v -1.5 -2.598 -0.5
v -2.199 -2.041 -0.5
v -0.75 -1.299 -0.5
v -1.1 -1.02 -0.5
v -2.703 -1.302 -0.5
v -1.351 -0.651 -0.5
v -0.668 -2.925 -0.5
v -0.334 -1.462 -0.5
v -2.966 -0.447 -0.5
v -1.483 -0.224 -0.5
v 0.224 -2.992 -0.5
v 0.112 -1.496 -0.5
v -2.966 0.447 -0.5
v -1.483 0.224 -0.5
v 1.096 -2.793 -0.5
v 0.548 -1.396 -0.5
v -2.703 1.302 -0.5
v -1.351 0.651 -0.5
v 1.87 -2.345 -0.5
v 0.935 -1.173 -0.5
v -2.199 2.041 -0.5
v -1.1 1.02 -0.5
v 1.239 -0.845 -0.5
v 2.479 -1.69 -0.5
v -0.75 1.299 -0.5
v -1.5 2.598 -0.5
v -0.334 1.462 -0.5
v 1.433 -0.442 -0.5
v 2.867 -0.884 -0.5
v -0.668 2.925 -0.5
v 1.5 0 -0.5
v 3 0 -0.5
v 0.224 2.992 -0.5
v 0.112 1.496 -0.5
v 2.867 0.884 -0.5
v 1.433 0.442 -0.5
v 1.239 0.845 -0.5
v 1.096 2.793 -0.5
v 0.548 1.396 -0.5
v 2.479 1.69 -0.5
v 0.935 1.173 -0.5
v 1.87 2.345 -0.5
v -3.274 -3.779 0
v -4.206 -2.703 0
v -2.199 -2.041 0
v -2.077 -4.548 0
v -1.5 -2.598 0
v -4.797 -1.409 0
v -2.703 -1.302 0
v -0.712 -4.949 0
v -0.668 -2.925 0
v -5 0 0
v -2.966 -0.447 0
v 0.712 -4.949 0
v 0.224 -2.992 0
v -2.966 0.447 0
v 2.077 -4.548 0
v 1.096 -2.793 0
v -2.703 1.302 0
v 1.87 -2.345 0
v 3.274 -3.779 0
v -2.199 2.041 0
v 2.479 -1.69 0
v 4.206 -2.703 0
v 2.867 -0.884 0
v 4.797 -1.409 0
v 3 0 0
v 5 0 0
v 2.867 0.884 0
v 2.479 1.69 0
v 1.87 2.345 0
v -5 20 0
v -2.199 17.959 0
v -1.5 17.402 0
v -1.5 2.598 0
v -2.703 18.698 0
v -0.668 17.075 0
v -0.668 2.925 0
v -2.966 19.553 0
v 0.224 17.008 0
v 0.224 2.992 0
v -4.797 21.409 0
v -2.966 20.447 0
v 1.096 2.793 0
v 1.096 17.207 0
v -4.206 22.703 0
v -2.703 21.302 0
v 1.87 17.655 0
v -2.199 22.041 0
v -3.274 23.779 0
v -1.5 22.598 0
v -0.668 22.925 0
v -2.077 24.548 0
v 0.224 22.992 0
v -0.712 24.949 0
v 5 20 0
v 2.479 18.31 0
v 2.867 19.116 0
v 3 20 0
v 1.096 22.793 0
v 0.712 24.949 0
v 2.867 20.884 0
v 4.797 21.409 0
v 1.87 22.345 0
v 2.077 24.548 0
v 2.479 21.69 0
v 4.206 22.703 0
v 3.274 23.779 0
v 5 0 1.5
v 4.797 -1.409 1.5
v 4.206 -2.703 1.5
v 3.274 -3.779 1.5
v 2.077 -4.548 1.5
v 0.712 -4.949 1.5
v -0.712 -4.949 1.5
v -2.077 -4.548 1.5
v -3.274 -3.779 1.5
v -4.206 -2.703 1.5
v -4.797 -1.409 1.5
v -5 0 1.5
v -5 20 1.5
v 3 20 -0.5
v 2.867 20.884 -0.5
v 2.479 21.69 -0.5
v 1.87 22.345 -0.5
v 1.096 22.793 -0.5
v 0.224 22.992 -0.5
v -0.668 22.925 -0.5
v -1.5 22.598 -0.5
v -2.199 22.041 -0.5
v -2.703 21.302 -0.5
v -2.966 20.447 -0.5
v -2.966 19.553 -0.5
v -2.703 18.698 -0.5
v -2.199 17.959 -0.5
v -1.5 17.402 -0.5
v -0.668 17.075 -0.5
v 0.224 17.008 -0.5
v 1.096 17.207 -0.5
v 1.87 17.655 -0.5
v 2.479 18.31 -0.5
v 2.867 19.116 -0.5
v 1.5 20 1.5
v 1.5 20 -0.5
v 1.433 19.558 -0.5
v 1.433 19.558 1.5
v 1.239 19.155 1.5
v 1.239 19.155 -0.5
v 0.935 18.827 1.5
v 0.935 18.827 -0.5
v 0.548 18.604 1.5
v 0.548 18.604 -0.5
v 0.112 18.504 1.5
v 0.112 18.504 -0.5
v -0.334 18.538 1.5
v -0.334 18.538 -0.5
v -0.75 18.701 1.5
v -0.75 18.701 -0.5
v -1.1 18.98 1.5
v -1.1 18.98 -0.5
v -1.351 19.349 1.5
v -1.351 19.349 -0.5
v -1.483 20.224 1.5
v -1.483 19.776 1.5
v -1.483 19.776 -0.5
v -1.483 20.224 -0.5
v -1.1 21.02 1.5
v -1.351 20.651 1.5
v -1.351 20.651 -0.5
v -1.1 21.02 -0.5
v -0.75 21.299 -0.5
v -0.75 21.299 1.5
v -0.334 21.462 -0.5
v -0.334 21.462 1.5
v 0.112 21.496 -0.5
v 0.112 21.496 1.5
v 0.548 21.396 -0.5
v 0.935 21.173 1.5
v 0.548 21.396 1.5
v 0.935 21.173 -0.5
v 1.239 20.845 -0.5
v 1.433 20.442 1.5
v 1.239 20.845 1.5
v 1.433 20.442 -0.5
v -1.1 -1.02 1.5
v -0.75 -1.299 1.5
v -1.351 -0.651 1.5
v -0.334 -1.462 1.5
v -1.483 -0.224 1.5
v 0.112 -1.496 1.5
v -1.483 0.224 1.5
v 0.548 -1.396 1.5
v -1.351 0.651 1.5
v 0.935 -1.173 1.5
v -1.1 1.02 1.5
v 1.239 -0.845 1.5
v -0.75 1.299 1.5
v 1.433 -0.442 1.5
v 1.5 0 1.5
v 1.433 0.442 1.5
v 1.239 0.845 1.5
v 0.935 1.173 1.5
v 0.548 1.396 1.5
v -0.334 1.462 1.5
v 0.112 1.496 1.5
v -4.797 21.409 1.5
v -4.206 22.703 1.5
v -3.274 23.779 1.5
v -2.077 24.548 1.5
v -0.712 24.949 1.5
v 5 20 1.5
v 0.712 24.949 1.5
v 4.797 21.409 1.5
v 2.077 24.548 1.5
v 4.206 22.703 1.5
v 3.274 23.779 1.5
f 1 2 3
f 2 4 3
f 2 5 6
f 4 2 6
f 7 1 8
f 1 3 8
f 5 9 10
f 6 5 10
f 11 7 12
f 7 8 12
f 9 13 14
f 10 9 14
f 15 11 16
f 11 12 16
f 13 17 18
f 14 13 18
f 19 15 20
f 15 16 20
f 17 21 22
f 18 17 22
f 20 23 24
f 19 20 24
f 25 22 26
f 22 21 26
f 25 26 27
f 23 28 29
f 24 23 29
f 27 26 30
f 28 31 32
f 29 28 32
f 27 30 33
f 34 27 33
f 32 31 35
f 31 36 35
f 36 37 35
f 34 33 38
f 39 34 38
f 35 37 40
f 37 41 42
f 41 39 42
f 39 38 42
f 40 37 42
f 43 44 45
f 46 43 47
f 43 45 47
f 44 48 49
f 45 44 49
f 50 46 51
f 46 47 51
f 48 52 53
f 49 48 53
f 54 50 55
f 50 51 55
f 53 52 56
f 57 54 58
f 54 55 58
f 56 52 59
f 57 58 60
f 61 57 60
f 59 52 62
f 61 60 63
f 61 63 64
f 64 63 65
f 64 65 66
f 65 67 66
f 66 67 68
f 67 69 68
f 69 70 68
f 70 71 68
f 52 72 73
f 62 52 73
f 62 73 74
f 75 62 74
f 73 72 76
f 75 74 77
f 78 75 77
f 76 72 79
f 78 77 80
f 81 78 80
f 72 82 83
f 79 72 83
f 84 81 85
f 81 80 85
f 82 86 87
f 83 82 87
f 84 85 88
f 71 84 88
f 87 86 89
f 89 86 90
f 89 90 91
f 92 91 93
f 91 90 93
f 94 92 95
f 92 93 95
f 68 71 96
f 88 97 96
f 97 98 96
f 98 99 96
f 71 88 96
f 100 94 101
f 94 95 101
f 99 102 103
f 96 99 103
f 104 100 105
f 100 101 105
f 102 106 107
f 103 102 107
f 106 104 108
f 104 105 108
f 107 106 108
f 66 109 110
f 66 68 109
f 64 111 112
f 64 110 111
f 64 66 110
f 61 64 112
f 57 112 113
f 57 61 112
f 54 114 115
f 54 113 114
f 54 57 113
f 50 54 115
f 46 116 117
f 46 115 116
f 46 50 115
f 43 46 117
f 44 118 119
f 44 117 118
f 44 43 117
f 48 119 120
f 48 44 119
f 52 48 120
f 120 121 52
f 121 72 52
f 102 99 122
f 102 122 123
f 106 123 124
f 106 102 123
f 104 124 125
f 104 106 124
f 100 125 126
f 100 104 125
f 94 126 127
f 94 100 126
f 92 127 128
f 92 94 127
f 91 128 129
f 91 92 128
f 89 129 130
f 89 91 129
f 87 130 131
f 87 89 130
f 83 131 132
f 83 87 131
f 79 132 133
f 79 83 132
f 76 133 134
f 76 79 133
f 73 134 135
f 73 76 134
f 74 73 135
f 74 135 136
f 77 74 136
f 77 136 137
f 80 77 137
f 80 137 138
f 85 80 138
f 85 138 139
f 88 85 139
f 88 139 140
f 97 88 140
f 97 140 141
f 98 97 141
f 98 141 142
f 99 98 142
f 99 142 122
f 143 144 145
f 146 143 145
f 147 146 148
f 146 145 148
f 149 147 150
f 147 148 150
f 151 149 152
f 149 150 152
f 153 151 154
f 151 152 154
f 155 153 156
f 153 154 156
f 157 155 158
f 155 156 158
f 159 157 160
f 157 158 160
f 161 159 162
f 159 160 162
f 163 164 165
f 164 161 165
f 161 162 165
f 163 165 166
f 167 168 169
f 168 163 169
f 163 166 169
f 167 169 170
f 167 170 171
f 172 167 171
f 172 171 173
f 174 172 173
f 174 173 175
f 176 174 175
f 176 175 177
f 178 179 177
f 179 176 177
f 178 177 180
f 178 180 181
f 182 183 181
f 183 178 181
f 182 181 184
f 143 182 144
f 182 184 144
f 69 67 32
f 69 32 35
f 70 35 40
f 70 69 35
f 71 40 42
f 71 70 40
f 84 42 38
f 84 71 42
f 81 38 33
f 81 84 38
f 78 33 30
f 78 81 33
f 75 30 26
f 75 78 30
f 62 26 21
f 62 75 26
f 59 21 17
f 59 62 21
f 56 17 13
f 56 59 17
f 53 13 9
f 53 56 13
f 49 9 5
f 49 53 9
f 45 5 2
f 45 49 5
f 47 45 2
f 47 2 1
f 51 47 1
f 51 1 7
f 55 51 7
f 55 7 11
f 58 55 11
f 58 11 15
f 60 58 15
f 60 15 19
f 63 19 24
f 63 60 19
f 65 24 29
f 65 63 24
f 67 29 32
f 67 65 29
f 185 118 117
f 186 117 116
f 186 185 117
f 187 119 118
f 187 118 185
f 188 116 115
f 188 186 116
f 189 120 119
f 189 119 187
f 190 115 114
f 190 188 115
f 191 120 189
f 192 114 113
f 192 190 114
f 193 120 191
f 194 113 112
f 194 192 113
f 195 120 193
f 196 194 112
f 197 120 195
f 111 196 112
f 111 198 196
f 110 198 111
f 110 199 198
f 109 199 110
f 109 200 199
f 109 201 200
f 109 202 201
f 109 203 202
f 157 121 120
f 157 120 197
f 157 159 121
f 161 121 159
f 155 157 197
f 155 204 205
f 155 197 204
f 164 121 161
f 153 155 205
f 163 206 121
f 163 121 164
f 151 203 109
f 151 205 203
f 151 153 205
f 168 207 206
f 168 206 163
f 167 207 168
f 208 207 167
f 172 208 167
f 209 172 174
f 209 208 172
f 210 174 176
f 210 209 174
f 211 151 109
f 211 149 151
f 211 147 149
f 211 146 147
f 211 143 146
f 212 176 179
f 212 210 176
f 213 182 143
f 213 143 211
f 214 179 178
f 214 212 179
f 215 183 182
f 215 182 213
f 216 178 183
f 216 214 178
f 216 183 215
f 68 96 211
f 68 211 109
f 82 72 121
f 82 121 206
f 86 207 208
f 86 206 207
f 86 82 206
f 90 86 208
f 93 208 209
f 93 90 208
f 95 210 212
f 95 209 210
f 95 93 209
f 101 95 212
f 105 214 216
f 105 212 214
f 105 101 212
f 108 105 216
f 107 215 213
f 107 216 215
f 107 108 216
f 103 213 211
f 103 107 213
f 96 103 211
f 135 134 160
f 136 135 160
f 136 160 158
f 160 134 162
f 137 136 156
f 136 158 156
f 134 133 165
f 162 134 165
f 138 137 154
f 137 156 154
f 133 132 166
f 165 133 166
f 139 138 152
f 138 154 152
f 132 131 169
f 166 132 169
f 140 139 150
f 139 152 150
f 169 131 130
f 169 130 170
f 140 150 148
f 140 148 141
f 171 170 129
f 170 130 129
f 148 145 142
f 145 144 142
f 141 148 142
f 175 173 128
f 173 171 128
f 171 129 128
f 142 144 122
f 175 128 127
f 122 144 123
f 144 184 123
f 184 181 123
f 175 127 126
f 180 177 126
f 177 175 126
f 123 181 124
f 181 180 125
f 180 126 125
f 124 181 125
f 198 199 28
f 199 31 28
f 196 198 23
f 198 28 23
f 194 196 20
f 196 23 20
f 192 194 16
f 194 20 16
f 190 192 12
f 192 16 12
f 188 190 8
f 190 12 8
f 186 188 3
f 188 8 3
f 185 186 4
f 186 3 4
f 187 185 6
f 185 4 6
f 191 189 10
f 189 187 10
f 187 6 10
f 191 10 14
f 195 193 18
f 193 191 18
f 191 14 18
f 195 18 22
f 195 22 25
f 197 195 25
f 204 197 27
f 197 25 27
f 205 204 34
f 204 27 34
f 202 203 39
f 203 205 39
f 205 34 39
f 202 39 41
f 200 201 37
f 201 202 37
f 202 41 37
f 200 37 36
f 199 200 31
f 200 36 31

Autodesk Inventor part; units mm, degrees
ref_plane "YZ Plane" through (0, 0, 0) normal (1, 0, 0) x (0, 1, 0)
ref_plane "XZ Plane" through (0, 0, 0) normal (0, 1, 0) x (-1, 0, 0)
ref_plane "XY Plane" through (0, 0, 0) normal (0, 0, 1) x (1, 0, 0)
sketch "Skizze1" plane through (0, 0, 0) normal (0, 0, 1) x (1, 0, 0)
  line L0 (0, 31) -> (0, -11) construction
  line L1 (-7, 0) -> (7, 0) construction
  circle A0 centre (0, 0) radius 1.5
  arc A1 (-5, 0) -> (5, 0) centre (0, 0) ccw
  circle A2 centre (0, 20) radius 1.5
  arc A3 (5, 20) -> (-5, 20) centre (0, 20) ccw
  line L2 (-5, 20) -> (-5, 0)
  line L3 (5, 20) -> (5, 0)
  circle A4 centre (0, 0) radius 3
  circle A5 centre (0, 20) radius 3
  dimension "d0" = 3
  dimension "d1" = 10
  dimension "d4" = 1.5
  dimension "d7" = 20
extrude "Extrusion1" add sketch "Skizze1" along normal blind 1.5 contours L2 A3 L3 A1 | A4 | A5
extrude "Extrusion2" add sketch "Skizze1" against normal blind 0.5 contours A4 | A5
properties part number "Mouth-Lever"
